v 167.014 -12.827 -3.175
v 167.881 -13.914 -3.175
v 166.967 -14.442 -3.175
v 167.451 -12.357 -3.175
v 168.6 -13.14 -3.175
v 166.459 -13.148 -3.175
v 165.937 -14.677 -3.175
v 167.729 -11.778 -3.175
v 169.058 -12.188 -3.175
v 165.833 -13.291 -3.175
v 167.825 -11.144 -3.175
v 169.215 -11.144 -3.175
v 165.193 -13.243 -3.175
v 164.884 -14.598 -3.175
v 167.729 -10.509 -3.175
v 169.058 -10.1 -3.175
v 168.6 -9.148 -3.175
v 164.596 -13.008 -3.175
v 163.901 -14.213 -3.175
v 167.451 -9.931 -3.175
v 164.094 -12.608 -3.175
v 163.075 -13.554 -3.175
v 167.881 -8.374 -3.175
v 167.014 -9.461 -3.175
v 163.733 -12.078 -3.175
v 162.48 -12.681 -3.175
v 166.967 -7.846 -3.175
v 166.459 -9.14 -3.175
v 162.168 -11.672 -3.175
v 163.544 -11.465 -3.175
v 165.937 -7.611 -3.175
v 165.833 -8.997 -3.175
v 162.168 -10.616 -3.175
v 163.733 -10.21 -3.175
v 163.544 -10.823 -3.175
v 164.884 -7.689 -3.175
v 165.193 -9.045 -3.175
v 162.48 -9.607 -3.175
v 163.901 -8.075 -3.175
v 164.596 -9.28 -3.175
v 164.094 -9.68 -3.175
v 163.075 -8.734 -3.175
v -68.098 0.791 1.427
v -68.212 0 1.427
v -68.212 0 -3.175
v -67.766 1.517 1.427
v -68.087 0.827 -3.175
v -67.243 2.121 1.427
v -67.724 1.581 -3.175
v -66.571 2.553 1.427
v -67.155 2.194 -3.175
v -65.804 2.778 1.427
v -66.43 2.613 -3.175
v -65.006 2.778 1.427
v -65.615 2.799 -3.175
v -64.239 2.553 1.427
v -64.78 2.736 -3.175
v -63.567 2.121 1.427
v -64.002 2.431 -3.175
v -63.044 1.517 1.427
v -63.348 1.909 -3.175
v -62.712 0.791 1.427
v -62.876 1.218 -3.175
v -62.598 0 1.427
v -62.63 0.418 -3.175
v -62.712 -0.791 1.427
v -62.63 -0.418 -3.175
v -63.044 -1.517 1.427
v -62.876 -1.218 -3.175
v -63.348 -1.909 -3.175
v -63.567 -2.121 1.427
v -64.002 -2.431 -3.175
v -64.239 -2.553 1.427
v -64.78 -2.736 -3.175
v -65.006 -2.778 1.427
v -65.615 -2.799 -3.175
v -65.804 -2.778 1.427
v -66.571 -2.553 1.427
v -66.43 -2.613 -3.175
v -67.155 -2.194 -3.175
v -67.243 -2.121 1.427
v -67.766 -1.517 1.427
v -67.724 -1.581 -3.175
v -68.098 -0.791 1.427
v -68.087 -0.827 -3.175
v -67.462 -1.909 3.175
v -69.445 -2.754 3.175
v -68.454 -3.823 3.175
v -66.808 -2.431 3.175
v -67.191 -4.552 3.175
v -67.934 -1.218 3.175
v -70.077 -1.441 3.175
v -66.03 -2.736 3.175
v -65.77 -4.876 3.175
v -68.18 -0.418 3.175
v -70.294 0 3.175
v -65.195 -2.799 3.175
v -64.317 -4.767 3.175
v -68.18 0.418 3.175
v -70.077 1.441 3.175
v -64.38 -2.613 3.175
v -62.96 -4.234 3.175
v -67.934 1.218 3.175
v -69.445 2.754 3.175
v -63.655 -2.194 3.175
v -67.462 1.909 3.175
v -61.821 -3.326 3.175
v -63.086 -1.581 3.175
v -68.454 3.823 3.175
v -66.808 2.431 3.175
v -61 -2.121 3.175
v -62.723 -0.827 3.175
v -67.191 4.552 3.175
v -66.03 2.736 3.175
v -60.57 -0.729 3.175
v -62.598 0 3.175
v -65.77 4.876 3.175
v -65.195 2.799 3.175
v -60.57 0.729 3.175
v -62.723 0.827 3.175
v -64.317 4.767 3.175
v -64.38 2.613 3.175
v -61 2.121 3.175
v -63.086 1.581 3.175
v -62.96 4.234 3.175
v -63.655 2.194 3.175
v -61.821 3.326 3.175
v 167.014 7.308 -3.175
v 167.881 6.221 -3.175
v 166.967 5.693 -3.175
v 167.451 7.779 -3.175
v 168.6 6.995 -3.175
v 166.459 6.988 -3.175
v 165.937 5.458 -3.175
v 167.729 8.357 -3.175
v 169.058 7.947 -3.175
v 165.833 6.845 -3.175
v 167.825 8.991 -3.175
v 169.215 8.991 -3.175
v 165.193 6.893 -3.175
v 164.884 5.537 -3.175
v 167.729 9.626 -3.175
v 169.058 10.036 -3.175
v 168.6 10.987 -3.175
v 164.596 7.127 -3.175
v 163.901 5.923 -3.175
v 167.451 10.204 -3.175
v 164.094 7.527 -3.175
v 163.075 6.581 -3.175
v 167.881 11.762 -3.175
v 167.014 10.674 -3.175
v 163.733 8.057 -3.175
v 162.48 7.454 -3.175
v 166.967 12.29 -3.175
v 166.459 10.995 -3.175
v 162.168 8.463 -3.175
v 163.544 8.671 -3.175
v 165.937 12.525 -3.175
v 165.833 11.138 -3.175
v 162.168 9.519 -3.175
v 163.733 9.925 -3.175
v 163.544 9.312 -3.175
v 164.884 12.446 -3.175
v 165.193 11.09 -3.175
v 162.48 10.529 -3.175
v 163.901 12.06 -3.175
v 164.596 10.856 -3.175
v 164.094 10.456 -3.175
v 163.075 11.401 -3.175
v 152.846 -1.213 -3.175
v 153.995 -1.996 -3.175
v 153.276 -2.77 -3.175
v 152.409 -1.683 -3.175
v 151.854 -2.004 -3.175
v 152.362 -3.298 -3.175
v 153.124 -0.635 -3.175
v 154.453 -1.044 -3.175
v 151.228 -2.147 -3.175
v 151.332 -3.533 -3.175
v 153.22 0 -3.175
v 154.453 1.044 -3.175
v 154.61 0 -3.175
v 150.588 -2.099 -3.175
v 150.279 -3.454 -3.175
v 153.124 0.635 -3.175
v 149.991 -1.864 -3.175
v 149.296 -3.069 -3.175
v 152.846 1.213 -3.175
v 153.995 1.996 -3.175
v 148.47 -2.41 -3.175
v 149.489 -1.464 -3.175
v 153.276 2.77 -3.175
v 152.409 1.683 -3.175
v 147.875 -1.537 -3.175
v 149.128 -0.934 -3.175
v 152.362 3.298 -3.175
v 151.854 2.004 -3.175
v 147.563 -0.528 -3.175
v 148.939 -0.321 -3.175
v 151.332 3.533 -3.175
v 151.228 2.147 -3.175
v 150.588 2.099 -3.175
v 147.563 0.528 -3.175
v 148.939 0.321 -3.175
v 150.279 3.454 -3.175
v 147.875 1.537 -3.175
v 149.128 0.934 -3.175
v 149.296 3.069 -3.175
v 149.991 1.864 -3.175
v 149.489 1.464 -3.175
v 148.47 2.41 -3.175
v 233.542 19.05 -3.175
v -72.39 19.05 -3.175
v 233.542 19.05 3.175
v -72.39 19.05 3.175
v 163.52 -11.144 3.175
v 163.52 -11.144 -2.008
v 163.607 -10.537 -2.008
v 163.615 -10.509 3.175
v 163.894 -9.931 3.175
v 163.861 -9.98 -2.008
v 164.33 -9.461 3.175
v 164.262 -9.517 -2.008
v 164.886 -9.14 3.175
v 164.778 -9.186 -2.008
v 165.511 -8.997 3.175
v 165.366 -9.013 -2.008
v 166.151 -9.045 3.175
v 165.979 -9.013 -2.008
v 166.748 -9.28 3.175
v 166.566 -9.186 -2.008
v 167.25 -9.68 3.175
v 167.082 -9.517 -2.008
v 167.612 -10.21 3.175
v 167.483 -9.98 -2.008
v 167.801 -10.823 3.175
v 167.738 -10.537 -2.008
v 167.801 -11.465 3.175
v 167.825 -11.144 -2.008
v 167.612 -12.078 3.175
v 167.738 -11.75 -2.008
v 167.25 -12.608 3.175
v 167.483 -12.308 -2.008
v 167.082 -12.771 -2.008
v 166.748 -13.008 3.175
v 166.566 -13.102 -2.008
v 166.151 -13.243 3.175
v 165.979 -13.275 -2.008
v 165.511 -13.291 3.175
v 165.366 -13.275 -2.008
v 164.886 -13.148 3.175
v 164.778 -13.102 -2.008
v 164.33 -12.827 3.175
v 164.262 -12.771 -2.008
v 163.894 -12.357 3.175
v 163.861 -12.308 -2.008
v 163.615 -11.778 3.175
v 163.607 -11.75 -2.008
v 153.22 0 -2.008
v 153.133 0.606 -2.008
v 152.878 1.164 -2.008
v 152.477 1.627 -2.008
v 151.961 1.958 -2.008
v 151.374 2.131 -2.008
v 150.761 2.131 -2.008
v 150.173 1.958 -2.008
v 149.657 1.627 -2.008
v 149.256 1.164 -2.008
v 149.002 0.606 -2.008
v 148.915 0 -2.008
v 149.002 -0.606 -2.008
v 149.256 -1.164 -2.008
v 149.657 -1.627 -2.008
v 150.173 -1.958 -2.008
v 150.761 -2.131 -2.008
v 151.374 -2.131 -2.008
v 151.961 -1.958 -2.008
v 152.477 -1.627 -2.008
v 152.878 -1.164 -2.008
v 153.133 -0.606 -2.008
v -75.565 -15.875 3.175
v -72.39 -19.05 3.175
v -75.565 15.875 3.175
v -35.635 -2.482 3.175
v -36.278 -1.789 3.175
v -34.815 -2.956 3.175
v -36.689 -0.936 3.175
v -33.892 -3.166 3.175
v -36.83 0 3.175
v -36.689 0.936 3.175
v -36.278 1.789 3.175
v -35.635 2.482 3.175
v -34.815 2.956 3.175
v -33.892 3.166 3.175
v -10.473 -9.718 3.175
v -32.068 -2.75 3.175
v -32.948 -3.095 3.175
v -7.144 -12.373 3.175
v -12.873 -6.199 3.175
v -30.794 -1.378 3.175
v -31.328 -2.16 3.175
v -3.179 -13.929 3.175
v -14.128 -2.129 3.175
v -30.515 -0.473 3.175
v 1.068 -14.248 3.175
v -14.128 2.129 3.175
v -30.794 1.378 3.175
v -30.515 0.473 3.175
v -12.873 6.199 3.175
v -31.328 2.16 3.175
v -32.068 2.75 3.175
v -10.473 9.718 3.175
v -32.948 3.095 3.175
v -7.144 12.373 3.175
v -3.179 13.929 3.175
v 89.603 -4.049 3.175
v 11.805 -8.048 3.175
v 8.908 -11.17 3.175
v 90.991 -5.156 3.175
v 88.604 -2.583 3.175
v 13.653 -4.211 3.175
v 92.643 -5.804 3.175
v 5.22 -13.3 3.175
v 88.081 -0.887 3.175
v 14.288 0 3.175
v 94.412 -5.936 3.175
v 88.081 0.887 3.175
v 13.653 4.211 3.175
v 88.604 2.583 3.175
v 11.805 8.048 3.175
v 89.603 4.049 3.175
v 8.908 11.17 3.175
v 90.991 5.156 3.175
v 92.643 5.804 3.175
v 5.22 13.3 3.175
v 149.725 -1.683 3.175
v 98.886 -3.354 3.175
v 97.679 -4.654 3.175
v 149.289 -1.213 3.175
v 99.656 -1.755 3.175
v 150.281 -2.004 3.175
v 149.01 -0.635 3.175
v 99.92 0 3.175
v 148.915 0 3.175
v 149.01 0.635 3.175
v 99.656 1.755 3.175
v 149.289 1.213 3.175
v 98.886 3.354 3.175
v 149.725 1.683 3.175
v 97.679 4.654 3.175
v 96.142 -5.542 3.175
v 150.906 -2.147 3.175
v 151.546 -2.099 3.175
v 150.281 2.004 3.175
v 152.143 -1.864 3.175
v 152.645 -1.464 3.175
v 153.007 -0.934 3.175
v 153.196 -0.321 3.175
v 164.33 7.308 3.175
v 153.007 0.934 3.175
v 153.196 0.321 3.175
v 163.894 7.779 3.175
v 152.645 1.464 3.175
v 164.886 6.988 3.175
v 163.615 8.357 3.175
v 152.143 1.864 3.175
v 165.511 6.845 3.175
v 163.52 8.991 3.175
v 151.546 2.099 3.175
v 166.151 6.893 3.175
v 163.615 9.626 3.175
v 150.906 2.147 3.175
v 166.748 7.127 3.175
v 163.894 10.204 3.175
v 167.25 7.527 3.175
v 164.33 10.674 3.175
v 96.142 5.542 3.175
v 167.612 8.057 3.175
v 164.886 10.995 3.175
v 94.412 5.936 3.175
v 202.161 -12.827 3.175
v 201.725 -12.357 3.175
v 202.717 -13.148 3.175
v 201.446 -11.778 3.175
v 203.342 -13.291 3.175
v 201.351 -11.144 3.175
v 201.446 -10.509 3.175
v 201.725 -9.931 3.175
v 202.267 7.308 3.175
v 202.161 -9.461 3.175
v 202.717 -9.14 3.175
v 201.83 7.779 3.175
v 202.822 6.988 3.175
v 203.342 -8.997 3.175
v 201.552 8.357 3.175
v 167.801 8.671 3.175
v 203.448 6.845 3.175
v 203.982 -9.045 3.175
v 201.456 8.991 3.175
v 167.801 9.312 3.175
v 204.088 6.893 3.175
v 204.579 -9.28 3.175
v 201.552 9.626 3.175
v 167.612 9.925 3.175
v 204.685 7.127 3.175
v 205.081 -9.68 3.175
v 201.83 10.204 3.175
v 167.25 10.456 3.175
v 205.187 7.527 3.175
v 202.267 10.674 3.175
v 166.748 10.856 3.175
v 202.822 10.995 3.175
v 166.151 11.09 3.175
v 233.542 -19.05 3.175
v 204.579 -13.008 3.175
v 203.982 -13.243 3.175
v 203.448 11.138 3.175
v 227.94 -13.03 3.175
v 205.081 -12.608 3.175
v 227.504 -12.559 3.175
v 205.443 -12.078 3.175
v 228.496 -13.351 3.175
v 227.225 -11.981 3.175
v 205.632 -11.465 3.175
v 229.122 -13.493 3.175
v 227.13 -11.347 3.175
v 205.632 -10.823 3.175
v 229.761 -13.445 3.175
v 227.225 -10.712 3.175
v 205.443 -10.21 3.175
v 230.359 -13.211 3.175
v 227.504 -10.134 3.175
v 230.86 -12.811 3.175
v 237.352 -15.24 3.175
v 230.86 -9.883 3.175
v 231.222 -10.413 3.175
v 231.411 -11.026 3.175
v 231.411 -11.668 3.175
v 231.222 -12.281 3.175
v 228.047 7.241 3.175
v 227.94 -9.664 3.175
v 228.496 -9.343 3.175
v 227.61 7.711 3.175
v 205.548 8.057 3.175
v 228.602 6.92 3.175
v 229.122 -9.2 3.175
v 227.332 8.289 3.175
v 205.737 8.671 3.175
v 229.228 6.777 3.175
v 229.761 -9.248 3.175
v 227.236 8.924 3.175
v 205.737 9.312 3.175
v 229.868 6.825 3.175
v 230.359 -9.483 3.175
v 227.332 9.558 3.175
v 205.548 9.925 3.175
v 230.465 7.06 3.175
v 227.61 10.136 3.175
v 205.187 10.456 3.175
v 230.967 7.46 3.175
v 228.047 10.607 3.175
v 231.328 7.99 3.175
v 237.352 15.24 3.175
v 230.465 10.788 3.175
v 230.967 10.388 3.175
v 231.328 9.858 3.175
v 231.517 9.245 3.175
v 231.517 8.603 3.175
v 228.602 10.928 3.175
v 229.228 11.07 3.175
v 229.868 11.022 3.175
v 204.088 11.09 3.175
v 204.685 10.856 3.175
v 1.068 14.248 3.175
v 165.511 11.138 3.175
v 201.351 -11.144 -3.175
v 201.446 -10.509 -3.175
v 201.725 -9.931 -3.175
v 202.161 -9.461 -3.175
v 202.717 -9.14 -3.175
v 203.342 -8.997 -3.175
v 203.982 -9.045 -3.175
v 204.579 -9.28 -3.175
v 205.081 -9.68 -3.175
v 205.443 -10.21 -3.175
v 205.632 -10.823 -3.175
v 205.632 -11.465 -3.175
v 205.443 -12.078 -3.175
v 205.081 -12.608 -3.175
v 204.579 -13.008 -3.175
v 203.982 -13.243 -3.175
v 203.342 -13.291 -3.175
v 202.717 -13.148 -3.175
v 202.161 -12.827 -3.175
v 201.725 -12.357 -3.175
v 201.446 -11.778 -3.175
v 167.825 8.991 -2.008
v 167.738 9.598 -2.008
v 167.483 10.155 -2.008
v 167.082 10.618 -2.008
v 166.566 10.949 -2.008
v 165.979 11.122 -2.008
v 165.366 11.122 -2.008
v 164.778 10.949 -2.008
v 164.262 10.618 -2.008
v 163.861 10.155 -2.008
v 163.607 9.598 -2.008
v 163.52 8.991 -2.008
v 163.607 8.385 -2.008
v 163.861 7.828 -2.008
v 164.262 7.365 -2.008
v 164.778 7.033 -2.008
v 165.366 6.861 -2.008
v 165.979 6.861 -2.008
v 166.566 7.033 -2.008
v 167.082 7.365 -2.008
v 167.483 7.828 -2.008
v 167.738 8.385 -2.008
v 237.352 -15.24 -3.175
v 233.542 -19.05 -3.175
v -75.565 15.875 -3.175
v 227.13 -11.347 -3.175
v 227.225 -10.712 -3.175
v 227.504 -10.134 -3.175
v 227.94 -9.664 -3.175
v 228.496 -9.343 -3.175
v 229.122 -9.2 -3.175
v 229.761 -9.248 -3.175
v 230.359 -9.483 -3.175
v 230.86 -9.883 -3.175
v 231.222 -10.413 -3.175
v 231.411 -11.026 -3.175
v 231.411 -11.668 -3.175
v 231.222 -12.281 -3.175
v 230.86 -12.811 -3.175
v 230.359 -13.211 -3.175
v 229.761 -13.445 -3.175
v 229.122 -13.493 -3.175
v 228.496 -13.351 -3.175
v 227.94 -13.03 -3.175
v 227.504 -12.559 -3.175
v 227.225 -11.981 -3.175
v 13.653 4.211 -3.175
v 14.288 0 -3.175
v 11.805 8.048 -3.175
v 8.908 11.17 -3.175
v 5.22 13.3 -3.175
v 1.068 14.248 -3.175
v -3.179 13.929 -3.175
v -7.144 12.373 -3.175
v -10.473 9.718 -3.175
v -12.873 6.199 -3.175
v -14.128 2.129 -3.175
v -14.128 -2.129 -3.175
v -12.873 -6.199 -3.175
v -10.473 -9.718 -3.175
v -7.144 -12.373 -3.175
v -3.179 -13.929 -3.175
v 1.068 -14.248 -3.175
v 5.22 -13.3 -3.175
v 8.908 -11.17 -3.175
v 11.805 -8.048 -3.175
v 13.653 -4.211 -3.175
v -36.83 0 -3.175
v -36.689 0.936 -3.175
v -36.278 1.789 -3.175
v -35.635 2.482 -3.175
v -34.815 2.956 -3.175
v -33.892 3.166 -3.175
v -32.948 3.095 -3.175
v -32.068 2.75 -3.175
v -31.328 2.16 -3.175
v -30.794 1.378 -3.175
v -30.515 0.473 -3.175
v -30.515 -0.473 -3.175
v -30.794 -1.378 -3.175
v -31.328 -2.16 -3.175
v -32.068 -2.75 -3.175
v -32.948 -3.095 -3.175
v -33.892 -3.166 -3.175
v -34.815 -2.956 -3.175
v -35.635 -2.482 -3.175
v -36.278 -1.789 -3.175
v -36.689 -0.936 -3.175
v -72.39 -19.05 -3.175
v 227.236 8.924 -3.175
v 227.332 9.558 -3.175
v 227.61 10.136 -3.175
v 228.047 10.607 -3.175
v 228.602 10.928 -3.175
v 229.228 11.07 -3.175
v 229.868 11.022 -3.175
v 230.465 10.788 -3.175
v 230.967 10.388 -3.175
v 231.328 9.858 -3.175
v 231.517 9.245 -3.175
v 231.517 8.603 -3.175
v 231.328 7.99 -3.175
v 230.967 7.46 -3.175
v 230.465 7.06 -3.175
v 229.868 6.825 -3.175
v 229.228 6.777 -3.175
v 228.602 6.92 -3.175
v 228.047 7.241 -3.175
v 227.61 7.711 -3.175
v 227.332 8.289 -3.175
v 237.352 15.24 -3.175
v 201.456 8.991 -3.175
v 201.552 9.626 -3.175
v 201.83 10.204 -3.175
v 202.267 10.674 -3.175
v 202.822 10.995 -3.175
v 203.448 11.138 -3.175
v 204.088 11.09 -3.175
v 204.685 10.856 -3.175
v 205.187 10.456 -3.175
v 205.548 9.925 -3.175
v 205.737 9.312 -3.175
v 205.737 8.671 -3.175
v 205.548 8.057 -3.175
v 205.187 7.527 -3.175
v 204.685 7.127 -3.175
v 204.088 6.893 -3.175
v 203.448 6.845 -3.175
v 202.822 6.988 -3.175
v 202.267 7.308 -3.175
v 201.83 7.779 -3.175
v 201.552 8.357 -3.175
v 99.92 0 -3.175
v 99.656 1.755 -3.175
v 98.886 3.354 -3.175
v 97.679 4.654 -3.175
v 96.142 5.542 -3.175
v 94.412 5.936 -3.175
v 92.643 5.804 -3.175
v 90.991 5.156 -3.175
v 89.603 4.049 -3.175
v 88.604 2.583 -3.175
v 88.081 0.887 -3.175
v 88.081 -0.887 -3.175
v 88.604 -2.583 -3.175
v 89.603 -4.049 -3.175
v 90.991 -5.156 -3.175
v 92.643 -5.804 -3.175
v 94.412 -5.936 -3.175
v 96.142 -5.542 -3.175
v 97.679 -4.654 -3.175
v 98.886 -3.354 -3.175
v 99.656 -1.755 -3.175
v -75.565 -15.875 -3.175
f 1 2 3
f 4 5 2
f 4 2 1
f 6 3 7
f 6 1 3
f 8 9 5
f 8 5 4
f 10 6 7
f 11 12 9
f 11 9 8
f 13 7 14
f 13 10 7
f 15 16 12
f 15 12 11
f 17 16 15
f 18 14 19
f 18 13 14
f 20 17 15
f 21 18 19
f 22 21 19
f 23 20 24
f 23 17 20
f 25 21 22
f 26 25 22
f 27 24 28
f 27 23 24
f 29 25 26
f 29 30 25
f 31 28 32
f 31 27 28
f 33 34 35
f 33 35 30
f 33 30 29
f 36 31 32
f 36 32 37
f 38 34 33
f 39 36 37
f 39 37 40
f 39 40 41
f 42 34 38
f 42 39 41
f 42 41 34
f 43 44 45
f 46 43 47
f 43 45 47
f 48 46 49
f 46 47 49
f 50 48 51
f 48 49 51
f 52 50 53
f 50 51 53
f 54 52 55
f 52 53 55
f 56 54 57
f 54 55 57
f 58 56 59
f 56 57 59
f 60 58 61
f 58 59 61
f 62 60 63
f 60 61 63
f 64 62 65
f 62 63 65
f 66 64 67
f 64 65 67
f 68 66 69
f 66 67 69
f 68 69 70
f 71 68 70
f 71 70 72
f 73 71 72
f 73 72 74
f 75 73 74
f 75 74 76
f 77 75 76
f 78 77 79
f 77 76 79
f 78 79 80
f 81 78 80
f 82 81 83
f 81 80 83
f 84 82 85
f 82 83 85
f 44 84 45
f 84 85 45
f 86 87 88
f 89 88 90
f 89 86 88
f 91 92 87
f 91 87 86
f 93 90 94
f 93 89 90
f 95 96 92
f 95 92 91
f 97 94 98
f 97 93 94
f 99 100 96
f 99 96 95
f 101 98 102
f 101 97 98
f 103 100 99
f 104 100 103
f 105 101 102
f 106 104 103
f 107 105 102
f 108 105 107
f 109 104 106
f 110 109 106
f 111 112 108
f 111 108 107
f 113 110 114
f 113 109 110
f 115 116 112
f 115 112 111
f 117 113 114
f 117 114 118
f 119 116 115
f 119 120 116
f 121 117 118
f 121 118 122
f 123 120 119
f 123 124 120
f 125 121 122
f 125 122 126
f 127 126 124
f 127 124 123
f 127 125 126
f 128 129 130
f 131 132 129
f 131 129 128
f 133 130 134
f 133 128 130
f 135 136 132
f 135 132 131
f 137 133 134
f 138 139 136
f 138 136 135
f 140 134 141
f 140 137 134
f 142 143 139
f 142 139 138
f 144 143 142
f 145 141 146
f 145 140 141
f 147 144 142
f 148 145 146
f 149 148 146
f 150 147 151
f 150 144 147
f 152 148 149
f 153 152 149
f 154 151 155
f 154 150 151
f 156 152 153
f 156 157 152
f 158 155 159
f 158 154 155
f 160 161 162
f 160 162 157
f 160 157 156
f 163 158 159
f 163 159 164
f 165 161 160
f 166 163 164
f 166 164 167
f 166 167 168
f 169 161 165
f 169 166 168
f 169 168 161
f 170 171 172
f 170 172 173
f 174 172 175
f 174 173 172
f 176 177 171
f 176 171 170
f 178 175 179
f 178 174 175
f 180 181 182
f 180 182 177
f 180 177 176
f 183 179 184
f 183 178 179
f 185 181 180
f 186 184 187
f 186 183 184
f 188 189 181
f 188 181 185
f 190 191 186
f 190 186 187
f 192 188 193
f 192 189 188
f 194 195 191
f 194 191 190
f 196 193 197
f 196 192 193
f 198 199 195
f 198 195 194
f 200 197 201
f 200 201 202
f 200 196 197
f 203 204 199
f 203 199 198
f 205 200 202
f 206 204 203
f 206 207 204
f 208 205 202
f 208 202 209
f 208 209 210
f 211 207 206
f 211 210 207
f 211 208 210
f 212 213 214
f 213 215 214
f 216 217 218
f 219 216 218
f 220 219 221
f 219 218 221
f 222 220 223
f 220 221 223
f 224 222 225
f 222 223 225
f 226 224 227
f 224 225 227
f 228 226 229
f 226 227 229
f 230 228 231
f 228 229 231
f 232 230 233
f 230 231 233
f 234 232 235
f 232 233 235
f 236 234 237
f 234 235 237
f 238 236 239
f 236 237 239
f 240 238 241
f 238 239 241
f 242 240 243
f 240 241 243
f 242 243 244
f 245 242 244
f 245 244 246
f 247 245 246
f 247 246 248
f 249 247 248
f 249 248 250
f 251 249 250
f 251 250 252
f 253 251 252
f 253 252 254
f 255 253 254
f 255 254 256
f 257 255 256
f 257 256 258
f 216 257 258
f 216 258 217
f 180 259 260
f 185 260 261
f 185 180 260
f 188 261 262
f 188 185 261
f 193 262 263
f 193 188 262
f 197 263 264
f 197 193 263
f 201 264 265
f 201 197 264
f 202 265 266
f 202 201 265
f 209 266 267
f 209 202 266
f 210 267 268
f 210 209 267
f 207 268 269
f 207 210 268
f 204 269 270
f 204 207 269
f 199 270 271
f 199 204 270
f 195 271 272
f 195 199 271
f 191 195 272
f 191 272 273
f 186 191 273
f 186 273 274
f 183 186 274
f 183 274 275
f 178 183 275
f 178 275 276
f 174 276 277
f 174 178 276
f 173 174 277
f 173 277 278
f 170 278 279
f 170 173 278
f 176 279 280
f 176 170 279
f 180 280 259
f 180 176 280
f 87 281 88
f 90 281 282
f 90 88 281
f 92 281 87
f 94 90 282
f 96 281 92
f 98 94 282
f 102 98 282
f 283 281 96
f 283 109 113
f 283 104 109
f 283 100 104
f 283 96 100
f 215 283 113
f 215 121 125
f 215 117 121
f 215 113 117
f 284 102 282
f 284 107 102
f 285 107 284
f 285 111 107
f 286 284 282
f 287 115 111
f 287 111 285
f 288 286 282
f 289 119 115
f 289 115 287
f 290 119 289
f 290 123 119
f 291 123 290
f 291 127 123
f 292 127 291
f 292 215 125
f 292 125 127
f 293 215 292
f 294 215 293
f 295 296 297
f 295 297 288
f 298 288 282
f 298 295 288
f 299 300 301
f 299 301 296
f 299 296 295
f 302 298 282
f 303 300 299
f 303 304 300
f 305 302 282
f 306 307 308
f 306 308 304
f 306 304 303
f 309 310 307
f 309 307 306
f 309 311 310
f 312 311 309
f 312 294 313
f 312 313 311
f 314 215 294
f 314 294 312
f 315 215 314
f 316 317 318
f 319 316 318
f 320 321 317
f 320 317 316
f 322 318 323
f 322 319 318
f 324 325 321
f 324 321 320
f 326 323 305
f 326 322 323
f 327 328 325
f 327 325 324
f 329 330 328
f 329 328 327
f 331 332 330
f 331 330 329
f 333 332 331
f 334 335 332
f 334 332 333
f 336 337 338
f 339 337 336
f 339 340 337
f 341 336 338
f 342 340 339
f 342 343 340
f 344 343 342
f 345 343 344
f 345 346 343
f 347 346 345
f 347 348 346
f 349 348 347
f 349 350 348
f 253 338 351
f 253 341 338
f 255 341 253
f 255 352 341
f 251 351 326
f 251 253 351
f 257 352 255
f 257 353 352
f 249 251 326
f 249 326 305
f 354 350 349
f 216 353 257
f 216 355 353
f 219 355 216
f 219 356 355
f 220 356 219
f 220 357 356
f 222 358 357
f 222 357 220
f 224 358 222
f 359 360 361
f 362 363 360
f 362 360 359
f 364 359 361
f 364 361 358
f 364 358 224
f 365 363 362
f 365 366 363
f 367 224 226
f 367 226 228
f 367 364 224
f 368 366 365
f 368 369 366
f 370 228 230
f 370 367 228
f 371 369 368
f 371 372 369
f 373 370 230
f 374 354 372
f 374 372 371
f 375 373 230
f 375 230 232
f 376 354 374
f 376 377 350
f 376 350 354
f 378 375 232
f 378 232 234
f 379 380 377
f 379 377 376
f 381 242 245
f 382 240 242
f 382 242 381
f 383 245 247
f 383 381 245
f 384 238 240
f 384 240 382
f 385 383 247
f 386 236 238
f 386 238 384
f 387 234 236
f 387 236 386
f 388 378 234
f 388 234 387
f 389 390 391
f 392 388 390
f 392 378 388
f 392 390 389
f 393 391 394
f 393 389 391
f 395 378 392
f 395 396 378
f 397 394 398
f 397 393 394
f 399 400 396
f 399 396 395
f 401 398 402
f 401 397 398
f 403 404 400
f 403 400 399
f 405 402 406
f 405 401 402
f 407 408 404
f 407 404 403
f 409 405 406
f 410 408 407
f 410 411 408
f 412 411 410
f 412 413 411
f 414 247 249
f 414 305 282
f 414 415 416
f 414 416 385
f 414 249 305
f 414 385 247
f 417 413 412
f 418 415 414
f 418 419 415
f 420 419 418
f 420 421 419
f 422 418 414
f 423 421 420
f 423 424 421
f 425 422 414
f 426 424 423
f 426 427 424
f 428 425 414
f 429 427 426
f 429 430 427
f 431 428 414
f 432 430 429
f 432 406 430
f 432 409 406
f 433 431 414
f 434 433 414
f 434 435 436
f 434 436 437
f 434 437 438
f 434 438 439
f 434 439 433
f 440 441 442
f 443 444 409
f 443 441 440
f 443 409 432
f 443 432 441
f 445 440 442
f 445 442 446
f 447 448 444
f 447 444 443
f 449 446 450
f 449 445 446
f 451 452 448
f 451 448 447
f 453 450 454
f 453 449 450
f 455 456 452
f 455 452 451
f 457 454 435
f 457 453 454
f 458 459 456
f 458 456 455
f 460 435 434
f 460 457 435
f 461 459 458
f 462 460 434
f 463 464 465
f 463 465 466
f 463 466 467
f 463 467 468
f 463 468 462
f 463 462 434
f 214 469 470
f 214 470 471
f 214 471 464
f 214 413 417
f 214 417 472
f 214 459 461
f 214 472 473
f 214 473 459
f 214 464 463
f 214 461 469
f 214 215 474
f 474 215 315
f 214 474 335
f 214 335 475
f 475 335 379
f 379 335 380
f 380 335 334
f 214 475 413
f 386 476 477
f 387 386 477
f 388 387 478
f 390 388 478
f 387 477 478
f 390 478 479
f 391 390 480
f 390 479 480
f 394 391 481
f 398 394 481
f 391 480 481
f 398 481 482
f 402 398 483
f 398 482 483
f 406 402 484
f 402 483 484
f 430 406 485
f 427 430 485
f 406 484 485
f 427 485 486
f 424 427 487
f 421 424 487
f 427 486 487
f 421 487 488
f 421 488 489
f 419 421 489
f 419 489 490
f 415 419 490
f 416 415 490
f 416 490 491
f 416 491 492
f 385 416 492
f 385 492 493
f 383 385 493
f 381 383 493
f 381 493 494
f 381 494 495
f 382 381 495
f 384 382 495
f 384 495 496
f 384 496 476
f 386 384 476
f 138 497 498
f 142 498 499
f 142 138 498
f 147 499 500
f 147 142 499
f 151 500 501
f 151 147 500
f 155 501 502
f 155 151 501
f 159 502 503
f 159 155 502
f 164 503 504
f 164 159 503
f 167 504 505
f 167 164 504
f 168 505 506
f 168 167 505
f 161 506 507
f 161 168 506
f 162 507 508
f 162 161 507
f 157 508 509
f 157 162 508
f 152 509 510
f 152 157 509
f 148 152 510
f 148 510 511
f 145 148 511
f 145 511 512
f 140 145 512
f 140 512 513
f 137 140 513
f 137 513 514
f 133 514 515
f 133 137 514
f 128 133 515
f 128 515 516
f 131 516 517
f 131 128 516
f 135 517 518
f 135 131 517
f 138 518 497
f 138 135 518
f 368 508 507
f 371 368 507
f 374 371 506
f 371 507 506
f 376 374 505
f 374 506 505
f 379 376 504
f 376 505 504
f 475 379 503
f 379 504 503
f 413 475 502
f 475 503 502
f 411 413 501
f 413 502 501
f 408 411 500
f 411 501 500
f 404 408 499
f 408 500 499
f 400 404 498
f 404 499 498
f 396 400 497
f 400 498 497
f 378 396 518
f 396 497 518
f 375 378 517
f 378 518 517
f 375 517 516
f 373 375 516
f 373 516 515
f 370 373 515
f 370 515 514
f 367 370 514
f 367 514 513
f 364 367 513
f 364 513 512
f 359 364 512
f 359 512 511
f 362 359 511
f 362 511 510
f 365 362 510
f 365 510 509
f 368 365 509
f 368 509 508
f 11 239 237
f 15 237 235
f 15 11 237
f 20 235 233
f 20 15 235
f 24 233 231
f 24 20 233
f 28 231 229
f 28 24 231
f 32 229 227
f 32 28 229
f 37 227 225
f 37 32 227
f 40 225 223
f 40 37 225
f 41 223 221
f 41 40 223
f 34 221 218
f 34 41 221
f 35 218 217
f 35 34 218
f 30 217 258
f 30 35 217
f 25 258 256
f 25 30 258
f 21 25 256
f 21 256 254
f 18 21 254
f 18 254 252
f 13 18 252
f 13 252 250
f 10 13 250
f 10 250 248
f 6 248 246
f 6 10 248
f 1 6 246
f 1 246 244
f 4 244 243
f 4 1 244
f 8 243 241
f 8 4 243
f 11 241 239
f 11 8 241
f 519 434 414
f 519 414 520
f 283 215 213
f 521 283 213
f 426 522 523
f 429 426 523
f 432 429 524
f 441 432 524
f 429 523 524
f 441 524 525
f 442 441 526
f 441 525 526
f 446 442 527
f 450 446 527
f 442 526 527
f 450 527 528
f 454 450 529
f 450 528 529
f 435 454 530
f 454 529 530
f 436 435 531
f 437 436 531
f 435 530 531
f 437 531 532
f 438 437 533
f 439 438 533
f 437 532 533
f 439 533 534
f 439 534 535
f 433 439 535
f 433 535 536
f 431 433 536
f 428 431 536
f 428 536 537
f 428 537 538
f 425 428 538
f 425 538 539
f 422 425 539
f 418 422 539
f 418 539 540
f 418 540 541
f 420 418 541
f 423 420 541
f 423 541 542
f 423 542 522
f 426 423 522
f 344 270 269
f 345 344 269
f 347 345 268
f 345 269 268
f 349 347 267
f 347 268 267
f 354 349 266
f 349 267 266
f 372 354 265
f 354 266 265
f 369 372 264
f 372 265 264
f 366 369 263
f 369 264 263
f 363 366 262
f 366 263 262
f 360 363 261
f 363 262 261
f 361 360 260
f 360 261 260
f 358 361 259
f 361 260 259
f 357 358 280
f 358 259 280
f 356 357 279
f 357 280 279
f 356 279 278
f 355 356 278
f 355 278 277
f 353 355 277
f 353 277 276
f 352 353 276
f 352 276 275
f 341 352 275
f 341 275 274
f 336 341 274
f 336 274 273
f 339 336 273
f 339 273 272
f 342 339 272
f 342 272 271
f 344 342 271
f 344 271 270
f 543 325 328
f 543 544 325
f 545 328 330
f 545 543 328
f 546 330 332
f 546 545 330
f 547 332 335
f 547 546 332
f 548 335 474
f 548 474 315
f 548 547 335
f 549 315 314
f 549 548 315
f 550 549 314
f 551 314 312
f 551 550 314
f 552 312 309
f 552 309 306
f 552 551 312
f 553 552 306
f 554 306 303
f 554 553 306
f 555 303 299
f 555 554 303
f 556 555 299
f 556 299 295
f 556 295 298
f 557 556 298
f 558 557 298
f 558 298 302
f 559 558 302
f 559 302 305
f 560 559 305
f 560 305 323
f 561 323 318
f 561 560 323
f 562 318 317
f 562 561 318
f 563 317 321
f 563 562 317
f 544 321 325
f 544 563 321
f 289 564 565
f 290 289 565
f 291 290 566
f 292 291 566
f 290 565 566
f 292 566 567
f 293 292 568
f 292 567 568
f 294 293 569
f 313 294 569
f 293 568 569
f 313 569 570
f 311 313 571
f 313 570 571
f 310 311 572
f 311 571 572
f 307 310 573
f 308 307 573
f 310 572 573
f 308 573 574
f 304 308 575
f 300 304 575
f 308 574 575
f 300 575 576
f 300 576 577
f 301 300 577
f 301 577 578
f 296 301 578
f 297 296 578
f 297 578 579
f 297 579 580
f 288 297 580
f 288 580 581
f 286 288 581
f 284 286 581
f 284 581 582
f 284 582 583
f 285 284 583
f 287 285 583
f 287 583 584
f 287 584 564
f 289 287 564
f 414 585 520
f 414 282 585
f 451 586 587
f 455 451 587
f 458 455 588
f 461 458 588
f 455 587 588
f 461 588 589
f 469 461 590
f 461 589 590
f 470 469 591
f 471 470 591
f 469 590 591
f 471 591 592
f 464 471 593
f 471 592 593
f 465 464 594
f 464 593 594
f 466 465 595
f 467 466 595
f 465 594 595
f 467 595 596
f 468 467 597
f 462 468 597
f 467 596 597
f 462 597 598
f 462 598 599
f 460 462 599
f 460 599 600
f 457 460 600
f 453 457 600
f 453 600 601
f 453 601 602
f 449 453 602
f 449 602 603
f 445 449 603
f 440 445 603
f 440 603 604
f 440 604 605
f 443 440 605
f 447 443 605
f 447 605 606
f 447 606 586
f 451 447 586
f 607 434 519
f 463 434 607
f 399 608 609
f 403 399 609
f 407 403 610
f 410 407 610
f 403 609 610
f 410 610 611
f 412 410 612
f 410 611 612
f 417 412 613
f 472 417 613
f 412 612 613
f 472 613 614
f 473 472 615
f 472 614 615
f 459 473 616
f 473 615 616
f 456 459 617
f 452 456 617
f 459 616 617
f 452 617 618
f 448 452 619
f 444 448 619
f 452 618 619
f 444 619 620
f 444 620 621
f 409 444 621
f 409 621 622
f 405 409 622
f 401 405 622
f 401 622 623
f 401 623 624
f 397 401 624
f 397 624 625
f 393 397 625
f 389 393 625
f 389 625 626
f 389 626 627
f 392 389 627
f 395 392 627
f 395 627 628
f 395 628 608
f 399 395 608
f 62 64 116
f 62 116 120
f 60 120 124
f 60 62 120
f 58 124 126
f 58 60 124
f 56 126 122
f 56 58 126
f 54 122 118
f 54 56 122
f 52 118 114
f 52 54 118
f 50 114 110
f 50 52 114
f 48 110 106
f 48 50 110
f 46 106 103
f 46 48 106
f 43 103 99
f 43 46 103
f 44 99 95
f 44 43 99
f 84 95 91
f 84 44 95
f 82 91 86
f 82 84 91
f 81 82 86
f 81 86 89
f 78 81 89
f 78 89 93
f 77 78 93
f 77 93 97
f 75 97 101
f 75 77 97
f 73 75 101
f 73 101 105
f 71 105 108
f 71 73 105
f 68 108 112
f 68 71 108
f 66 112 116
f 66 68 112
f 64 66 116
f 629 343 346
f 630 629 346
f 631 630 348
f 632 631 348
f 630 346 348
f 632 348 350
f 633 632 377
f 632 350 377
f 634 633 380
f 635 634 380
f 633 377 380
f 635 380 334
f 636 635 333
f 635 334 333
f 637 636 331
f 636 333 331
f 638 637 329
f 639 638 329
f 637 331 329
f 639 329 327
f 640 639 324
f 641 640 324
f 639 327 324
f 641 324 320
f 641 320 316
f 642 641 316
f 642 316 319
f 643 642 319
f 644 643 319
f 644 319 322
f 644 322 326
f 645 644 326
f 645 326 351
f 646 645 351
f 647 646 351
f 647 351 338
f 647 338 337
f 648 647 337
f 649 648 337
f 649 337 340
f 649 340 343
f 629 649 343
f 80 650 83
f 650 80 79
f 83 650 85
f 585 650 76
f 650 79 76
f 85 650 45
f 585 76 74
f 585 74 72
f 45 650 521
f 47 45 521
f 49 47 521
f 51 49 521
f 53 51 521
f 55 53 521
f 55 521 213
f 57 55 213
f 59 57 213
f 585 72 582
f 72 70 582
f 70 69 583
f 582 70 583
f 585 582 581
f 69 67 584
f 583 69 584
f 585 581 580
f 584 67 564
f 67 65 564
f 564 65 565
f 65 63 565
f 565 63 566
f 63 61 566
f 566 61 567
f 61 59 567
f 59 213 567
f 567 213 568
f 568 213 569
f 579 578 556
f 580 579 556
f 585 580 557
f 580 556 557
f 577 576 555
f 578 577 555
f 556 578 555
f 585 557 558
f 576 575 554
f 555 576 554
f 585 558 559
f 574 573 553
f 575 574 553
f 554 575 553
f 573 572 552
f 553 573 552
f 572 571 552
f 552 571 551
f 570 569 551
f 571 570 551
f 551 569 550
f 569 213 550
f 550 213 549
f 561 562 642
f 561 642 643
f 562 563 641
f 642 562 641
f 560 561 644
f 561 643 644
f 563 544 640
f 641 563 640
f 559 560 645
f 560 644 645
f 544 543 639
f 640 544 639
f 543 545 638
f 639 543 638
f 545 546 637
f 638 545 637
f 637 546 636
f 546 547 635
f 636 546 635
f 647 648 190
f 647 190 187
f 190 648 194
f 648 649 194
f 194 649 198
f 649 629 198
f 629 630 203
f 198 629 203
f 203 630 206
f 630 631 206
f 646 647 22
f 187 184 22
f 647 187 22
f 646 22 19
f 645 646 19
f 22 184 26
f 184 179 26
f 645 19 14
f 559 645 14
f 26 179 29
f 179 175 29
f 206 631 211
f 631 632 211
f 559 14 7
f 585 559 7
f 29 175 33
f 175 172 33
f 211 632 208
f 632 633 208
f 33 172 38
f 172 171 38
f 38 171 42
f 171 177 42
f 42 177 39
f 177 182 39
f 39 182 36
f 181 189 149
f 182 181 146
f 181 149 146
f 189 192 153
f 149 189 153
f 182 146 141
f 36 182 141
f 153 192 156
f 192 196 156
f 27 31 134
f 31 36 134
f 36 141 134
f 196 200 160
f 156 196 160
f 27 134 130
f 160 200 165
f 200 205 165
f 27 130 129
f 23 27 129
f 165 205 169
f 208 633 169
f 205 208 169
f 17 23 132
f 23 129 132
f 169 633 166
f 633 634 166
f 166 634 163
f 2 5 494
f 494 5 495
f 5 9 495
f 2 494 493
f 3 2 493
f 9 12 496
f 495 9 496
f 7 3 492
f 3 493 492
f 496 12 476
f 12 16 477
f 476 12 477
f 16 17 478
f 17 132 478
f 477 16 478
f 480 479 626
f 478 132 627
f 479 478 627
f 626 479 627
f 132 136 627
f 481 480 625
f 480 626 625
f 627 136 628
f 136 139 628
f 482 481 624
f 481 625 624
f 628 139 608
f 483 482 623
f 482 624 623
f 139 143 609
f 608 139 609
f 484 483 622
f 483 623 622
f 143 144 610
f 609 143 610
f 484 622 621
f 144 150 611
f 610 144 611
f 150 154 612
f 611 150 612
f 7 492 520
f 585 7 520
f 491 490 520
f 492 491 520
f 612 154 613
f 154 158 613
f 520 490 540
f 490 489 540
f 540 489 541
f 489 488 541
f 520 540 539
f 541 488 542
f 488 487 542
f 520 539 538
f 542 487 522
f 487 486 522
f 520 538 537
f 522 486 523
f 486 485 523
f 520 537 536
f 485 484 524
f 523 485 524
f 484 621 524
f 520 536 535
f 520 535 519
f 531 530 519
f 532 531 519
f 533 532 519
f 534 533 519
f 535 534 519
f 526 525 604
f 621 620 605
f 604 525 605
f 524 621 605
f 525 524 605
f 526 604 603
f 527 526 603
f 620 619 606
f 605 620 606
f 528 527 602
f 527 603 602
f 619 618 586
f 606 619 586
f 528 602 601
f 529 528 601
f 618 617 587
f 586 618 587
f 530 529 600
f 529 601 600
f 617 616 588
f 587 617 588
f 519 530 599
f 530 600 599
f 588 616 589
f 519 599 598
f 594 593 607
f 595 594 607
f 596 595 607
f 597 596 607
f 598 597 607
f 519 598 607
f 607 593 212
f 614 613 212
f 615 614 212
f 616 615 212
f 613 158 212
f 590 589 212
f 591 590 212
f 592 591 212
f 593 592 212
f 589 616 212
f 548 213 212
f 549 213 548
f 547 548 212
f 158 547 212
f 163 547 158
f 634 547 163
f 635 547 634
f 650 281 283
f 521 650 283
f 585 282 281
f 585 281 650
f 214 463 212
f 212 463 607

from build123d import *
from build123d.topology import SkipClean

# Parameters (mm, degrees)
SKETCH1_R                                          = 14.2875
BOSS_EXTRUDE1_DEPTH                                = 3.175
F_6_CLEARANCE_HOLE3_D                              = 4.3053
CUT_EXTRUDE1_DEPTH                                 = 255.792513626
CHAMFER1_SIZE                                      = 3.81
SKETCH10_W                                         = 50.8
SKETCH10_H                                         = 38.1
BOSS_EXTRUDE2_DEPTH                                = 6.35
CHAMFER2_SIZE                                      = 3.175
CSK_FOR_10_FLAT_HEAD_MACHINE_SCREW_100_D           = 5.6134
CSK_FOR_10_FLAT_HEAD_MACHINE_SCREW_100_CSINK_D     = 9.779
CSK_FOR_10_FLAT_HEAD_MACHINE_SCREW_100_CSINK_ANGLE = 100
F_1_4_0_25_DIAMETER_HOLE1_D                        = 6.35
CSK_FOR_6_FLAT_HEAD_MACHINE_SCREW_100_D            = 4.3053
CSK_FOR_6_FLAT_HEAD_MACHINE_SCREW_100_CSINK_D      = 7.0866
CSK_FOR_6_FLAT_HEAD_MACHINE_SCREW_100_CSINK_ANGLE  = 100
F_15_32_0_46875_DIAMETER_HOLE1_D                   = 11.90625


# Read off the part's stored shape, not the designer's step: DeleteFace1
with BuildPart() as part:
    # Sketch1 → Boss-Extrude1 (new, symmetric)
    with BuildSketch(Plane.XY):
        Polygon((0, 19.05), (-28.575, 19.05), (-28.575, -19.05), (0, -19.05), (247.281942035, -19.05), (254, 19.05), align=None)
        Circle(SKETCH1_R, mode=Mode.SUBTRACT)
    extrude(amount=BOSS_EXTRUDE1_DEPTH, both=True)

    # #6 Clearance Hole3 (through all)
    with Locations(Plane.XY.offset(3.175)):
        with Locations((229.388701471, 8.923791784), (229.282371239, -11.346798968), (203.503161764, -11.143926969), (203.608782335, 8.991375351), (165.672159691, 8.991375351), (165.672159691, -11.143926969), (151.067159691, 0)):
            Hole(F_6_CLEARANCE_HOLE3_D / 2)

    # Sketch9 → Cut-Extrude1 (cut, through all)
    with BuildSketch(Plane.XY.offset(3.175)):
        Polygon((254, 19.05), (247.281942035, -19.05), (237.352085197, -19.05), (237.352085197, 19.05), align=None)
    extrude(amount=-CUT_EXTRUDE1_DEPTH, mode=Mode.SUBTRACT)

    # Chamfer1
    chamfer1_edges = [part.edges().sort_by_distance(p)[0] for p in [
        (-28.575, -19.05, 0),
        (-28.575, 19.05, 0),
        (237.352085197, 19.05, 0),
        (237.352085197, -19.05, 0),
    ]]
    chamfer(chamfer1_edges, length=CHAMFER1_SIZE)

    # Sketch10 → Boss-Extrude2 (add, through all)
    with BuildSketch(Plane.XY.offset(3.175)):
        with Locations((-50.165, 0)):
            Rectangle(SKETCH10_W, SKETCH10_H)
    extrude(amount=-BOSS_EXTRUDE2_DEPTH)

    # Chamfer2
    chamfer2_edges = [part.edges().sort_by_distance(p)[0] for p in [
        (-75.565, -19.05, 0),
        (-75.565, 19.05, 0),
    ]]
    chamfer(chamfer2_edges, length=CHAMFER2_SIZE)

    # CSK for #10 Flat Head Machine Screw (100)1 (through all)
    with Locations(Plane.XY.offset(3.175)):
        with Locations((-65.405, 0)):
            CounterSinkHole(CSK_FOR_10_FLAT_HEAD_MACHINE_SCREW_100_D / 2, CSK_FOR_10_FLAT_HEAD_MACHINE_SCREW_100_CSINK_D / 2, counter_sink_angle=CSK_FOR_10_FLAT_HEAD_MACHINE_SCREW_100_CSINK_ANGLE)

    # 1/4 (0.25) Diameter Hole1 (through all)
    with Locations(Plane.XY.offset(3.175)):
        with Locations((-33.655, 0)):
            Hole(F_1_4_0_25_DIAMETER_HOLE1_D / 2)

    # CSK for #6 Flat Head Machine Screw (100)1 (through all)
    with Locations(Plane(origin=(0, 0, -3.175), x_dir=(-1, 0, 0), z_dir=(0, 0, -1))):
        with Locations((-151.067159691, 0), (-165.672159691, -11.143926969), (-165.672159691, 8.991375351)):
            CounterSinkHole(CSK_FOR_6_FLAT_HEAD_MACHINE_SCREW_100_D / 2, CSK_FOR_6_FLAT_HEAD_MACHINE_SCREW_100_CSINK_D / 2, counter_sink_angle=CSK_FOR_6_FLAT_HEAD_MACHINE_SCREW_100_CSINK_ANGLE)

    # 15/32 (0.46875) Diameter Hole1 (through all)
    with Locations(Plane(origin=(0, 0, -3.175), x_dir=(-1, 0, 0), z_dir=(0, 0, -1))):
        with Locations((-93.967218212, 0)):
            Hole(F_15_32_0_46875_DIAMETER_HOLE1_D / 2)

    # DeleteFace1 outline → DeleteFace1 (revolve)
    with SkipClean():  # the faces are left unmerged after this step: merging them gives an invalid solid
        with BuildSketch(Plane(origin=(-65.405, 0, 0), x_dir=(1, 0, 0), z_dir=(0, -1, 0))):
            Polygon((2.8067, 3.175), (2.8067, 1.427323288), (4.8895, 3.175), align=None)
        revolve(axis=Axis((-65.405, 0, 0), (0, 0, 1)))
    add(part.part.scale(1), mode=Mode.REPLACE)  # the faces are merged on a copy

    # DeleteFace1 2 outline → DeleteFace1 2 (revolve)
    with BuildSketch(Plane(origin=(165.672159691, 8.991375351, 0), x_dir=(1, 0, 0), z_dir=(0, -1, 0))):
        Polygon((3.5433, -3.175), (2.15265, -2.008106098), (2.15265, -3.175), align=None)
    revolve(axis=Axis((165.672159691, 8.991375351, 0), (0, 0, 1)))

    # DeleteFace1 3 outline → DeleteFace1 3 (revolve)
    with BuildSketch(Plane(origin=(165.672159691, -11.143926969, 0), x_dir=(1, 0, 0), z_dir=(0, -1, 0))):
        Polygon((3.5433, -3.175), (2.15265, -2.008106098), (2.15265, -3.175), align=None)
    revolve(axis=Axis((165.672159691, -11.143926969, 0), (0, 0, 1)))

    # DeleteFace1 4 outline → DeleteFace1 4 (revolve)
    with BuildSketch(Plane(origin=(151.067159691, 0, 0), x_dir=(1, 0, 0), z_dir=(0, -1, 0))):
        Polygon((3.5433, -3.175), (2.15265, -2.008106098), (2.15265, -3.175), align=None)
    revolve(axis=Axis((151.067159691, 0, 0), (0, 0, 1)))


solid = part.part
